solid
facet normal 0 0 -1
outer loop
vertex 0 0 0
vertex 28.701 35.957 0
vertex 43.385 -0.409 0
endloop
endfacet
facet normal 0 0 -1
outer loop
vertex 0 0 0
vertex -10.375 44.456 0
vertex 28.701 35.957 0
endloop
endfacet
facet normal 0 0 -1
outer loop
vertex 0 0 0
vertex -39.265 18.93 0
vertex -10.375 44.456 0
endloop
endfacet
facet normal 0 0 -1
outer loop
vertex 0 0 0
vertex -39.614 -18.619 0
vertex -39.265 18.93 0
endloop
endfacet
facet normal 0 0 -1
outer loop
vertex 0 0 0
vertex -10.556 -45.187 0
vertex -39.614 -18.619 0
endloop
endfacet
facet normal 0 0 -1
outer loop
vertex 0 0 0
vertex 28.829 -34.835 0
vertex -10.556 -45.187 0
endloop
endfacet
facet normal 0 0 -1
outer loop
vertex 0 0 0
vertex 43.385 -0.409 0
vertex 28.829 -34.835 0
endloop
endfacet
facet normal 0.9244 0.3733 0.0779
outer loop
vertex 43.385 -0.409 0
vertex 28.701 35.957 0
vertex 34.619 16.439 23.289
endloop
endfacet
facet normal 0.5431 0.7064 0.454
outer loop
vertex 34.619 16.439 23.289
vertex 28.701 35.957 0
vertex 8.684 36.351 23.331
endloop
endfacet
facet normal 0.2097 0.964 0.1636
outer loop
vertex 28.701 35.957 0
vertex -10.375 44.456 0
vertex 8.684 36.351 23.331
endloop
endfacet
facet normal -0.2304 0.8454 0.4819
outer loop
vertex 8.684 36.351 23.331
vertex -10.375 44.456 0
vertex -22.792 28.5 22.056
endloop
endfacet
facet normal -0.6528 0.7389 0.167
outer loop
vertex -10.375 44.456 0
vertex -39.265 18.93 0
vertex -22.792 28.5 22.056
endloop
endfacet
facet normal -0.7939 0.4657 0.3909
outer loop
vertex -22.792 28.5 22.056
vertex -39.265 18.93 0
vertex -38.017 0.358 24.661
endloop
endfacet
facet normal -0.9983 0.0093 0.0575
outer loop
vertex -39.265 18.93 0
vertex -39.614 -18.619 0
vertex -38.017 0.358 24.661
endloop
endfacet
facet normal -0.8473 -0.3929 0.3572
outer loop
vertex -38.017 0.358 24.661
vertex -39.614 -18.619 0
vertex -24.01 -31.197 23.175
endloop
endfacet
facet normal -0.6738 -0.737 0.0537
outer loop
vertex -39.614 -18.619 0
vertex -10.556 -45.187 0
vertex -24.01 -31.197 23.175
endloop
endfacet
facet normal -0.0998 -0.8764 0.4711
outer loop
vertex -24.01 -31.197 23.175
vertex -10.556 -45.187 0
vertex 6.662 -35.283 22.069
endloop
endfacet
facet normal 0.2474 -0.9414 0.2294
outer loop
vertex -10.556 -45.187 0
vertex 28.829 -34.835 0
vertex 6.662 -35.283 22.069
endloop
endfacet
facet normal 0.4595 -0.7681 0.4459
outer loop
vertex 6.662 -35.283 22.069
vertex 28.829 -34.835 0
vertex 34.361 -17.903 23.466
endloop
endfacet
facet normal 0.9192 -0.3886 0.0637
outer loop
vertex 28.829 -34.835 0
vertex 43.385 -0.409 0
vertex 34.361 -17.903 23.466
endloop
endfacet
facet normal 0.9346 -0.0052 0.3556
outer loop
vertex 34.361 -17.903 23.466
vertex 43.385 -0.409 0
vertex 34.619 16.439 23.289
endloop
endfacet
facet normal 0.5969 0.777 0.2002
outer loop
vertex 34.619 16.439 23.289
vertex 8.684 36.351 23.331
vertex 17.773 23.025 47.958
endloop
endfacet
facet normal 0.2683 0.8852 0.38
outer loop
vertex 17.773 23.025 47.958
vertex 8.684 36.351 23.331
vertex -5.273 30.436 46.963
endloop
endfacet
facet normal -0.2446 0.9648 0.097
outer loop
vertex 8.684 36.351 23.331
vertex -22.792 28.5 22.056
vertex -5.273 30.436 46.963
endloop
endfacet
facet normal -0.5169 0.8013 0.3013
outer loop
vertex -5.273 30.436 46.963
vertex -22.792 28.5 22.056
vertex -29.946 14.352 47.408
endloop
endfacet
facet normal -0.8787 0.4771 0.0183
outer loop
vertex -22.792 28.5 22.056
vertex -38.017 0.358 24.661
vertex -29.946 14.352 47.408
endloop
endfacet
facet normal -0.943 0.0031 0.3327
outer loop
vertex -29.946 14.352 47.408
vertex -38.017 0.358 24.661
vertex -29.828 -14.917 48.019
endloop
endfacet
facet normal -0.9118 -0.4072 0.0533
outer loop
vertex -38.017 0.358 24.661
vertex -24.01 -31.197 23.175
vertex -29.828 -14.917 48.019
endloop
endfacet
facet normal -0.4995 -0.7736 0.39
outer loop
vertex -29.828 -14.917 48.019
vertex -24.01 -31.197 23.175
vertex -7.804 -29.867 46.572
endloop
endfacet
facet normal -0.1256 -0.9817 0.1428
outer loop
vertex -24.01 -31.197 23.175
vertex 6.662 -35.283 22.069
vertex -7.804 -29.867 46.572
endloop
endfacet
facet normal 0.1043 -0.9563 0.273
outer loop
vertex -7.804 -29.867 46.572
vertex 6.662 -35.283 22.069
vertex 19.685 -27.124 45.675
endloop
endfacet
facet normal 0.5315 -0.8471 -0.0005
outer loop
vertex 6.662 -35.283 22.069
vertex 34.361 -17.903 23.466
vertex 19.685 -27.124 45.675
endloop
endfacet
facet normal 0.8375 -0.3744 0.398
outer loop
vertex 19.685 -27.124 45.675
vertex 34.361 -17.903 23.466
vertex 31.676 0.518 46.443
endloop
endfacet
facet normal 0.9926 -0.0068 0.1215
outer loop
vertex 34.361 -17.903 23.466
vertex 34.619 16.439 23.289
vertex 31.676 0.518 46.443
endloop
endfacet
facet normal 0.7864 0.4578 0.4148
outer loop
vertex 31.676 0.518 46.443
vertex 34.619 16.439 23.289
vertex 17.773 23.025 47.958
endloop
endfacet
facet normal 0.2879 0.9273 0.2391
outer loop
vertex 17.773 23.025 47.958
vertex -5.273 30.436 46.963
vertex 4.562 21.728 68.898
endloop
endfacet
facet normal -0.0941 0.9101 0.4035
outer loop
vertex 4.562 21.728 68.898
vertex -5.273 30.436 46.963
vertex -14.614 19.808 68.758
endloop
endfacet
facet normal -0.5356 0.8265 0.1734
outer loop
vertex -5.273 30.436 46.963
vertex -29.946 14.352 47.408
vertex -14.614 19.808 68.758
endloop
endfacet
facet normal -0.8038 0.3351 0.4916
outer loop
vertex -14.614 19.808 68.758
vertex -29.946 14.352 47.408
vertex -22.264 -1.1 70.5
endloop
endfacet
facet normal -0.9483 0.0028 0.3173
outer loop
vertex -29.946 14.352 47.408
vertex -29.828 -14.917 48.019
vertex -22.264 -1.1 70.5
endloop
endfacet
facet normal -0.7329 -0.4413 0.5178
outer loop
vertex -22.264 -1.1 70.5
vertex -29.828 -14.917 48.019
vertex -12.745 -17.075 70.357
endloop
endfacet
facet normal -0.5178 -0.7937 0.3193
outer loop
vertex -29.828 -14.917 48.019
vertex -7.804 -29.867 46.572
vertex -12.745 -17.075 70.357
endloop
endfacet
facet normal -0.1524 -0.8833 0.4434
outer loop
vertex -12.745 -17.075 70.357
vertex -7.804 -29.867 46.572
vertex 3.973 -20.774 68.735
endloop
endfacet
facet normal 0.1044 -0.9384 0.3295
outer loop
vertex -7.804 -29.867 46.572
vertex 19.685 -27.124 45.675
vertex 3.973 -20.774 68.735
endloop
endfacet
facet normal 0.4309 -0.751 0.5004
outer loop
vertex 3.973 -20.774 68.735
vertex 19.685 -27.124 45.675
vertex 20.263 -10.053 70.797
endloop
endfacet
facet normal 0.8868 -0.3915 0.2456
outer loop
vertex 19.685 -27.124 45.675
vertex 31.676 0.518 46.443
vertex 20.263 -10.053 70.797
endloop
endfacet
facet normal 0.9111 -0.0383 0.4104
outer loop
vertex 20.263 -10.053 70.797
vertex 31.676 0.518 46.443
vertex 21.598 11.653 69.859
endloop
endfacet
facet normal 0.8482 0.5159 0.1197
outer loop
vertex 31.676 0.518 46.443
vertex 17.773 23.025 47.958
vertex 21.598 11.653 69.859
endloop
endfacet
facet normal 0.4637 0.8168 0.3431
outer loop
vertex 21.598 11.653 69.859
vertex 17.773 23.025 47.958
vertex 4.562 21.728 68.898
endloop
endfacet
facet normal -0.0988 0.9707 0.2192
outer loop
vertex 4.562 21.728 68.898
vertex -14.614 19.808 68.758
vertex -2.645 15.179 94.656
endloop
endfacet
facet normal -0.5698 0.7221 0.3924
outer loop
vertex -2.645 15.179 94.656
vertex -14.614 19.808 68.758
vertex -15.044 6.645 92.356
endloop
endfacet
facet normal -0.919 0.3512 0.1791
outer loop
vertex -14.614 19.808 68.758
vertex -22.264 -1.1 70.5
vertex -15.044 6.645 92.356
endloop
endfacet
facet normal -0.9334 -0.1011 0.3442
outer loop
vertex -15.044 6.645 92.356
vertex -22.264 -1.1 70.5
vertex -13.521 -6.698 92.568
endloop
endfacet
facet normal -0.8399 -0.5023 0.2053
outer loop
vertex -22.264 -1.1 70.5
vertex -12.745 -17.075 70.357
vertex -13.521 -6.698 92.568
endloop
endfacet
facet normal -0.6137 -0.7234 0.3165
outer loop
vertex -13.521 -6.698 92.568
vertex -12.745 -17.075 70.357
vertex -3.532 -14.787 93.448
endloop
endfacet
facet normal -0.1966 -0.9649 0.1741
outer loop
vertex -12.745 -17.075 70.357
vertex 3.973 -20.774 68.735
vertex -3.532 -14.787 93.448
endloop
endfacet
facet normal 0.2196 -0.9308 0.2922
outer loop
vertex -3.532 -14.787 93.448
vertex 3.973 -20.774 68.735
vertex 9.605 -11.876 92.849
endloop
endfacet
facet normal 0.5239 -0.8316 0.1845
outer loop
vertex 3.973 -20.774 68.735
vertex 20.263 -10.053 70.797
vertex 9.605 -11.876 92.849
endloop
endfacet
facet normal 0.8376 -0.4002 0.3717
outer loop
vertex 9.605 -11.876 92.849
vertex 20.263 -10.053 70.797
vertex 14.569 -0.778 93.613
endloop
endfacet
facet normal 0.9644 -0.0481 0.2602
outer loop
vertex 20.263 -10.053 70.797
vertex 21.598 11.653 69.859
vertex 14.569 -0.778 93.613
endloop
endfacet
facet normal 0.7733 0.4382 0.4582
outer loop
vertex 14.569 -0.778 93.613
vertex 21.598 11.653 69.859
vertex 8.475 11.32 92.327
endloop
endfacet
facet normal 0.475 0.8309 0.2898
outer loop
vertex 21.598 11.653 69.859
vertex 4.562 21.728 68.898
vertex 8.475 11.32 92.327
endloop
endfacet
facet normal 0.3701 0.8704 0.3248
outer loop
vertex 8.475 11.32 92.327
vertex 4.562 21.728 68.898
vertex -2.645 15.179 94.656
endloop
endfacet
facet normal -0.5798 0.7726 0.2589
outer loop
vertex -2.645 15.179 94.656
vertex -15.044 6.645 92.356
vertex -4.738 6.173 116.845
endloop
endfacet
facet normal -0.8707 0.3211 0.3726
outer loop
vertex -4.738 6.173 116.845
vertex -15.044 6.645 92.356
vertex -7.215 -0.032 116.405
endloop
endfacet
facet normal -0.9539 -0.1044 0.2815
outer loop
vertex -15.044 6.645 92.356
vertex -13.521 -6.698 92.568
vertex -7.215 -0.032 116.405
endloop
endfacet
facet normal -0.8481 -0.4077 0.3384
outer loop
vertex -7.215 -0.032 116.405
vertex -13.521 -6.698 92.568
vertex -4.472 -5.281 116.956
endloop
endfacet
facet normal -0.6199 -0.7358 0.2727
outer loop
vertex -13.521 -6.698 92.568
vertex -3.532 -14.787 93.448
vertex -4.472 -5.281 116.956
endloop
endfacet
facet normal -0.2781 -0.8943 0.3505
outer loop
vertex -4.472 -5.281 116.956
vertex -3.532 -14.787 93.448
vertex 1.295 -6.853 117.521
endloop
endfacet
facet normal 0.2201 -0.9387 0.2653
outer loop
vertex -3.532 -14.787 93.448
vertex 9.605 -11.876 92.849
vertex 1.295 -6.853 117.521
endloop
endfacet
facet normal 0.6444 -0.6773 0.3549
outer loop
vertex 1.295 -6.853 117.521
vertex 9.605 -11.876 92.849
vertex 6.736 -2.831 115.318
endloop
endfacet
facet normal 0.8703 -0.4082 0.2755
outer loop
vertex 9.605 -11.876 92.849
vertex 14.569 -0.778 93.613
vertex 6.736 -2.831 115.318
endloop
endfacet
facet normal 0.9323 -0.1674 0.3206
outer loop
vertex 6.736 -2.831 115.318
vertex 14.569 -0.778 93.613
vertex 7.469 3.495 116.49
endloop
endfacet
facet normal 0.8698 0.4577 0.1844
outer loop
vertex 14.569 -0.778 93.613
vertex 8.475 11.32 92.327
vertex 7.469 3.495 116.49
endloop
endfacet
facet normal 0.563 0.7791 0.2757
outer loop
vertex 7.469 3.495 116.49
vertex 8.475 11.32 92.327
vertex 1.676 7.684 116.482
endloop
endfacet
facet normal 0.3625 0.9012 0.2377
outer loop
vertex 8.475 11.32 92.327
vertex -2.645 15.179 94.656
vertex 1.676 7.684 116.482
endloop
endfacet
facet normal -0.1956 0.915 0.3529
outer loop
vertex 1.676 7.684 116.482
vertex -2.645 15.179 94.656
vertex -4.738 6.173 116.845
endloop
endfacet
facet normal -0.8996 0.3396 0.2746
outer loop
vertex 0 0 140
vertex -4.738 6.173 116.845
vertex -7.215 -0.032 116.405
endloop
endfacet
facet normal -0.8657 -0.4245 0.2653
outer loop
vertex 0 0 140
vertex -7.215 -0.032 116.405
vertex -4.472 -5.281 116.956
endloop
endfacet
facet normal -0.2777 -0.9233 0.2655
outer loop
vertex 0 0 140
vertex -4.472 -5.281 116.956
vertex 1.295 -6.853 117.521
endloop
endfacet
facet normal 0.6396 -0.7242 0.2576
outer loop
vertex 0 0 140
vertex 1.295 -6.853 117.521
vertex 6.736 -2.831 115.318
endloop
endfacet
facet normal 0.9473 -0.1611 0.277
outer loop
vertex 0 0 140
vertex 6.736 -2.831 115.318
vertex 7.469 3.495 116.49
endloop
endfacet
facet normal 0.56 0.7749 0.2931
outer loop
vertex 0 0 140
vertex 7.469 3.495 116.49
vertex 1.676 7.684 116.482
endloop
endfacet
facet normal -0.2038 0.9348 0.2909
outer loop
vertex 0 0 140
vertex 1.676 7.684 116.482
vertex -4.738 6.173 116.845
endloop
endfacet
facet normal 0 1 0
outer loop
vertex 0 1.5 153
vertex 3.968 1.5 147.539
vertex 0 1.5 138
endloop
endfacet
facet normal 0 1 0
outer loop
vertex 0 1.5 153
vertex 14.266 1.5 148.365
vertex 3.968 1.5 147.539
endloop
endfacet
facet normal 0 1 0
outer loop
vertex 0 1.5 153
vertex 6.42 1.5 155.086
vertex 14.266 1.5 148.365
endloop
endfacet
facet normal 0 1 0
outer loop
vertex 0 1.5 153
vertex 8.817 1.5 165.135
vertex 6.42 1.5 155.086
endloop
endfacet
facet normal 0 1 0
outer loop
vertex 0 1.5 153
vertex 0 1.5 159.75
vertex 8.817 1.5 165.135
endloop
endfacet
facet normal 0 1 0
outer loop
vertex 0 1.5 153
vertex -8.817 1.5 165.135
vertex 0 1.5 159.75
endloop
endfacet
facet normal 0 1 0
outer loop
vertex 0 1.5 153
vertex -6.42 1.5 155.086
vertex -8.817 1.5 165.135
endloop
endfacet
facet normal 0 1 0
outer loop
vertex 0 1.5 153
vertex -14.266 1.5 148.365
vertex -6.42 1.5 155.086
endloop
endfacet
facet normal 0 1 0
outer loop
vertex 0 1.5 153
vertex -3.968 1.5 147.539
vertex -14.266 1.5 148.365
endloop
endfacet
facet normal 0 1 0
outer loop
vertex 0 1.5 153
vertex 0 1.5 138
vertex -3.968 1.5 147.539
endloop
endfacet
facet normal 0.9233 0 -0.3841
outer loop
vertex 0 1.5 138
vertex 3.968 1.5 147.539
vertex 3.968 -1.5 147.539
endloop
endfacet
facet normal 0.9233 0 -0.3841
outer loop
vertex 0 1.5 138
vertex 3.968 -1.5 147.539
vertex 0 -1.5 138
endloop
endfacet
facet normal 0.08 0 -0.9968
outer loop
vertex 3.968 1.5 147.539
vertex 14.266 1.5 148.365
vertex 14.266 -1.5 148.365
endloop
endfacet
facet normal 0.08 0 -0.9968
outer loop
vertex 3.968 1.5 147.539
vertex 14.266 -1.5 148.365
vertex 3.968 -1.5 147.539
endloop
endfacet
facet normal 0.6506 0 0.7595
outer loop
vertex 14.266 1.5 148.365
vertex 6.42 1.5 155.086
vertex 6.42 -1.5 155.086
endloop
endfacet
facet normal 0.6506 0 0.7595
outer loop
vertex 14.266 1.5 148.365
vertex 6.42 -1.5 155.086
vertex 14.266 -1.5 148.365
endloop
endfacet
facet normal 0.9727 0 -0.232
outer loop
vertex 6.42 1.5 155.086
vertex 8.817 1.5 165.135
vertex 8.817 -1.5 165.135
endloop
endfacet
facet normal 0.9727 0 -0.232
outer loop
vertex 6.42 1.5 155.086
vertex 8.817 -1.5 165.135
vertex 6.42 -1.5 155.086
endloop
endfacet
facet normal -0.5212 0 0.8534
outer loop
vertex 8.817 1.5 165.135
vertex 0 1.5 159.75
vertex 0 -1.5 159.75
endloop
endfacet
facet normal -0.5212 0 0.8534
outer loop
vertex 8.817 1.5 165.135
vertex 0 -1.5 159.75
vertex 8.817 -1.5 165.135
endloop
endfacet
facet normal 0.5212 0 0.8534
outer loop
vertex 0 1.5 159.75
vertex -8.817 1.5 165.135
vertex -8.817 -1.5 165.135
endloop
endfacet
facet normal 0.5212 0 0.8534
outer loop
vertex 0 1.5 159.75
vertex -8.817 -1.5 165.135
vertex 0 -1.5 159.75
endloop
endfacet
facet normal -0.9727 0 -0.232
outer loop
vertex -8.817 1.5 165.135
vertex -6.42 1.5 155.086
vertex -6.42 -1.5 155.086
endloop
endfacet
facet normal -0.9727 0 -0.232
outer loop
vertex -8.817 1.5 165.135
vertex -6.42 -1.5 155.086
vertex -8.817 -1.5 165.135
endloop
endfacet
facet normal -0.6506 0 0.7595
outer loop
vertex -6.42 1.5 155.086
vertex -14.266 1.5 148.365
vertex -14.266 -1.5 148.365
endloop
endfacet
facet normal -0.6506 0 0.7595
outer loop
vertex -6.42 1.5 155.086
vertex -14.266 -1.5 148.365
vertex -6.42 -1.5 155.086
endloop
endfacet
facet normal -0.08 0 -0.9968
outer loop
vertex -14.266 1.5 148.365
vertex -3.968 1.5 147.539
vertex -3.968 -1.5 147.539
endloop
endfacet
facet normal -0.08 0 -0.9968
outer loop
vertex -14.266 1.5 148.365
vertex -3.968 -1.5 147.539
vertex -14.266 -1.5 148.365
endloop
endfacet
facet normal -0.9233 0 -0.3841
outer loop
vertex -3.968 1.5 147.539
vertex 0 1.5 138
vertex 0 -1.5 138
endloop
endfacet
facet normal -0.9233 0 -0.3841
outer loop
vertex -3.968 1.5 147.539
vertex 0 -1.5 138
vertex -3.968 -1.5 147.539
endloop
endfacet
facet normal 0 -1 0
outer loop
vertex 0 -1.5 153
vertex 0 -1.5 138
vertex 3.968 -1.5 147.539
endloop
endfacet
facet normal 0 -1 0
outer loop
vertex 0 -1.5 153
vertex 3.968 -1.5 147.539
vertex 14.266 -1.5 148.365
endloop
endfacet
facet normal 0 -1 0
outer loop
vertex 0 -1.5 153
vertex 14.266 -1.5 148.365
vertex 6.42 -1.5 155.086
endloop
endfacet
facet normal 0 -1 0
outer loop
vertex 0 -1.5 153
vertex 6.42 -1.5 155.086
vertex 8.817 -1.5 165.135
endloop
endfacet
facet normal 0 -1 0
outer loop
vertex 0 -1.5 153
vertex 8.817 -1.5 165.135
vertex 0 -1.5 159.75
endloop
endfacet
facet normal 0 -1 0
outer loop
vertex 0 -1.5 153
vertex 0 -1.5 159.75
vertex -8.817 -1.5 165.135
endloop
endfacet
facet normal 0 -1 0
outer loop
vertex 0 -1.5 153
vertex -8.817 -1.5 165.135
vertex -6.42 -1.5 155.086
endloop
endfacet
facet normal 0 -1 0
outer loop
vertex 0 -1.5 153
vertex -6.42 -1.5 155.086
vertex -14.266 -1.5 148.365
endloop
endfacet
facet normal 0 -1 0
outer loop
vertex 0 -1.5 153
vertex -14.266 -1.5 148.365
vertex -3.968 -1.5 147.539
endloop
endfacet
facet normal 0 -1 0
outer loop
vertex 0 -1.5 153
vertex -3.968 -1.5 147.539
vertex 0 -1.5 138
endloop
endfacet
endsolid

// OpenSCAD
// ── ESTRELA DO TOPO (comum às árvores de Natal) ──
// Não usa union(): a estrela entra no MESMO polyhedron que a árvore, como uma segunda
// casca fechada (as booleanas do OpenSCAD com malhas grandes demoram 10× mais). Os
// fatiadores juntam as cascas que se sobrepõem.
//   estrela_topo = "No topo"               estrela de pé, com 2 mm enterrados na ponta
//                  "À parte (para colar)"  estrela facetada deitada, ao lado da árvore
//                  "Sem estrela"
// Cada modelo define _topo_alt() (altura da ponta) e _r_max() (raio máximo da árvore).
// A mesma conta está em Maker_Pro_Frontend_Prod/lib/arvoresNatal.ts (pré-visualização).

function _q(a, b, c, d) = [[a, b, c], [a, c, d]];
function _prev() = !is_undef(modo) && modo == "preview";

// estrela de np pontas no plano XY: costas em z = 0, lados até z = b, bico até z = b + h
function _ept(i, np, R, ri, z, a0) = let(a = a0 + i * 180 / np, r = (i % 2 == 0) ? R : ri) [r * cos(a), r * sin(a), z];
function estrela_pts(np, R, ri, b, h, a0) = let(M = 2 * np)
    concat([for (i = [0 : M - 1]) _ept(i, np, R, ri, 0, a0)], [for (i = [0 : M - 1]) _ept(i, np, R, ri, b, a0)],
           [[0, 0, 0], [0, 0, b + h]]);
function estrela_faces(np, o) = let(M = 2 * np, C = o + 2 * M, A = C + 1) concat(
    [for (i = [0 : M - 1]) [C, o + (i + 1) % M, o + i]],
    [for (i = [0 : M - 1], t = _q(o + i, o + (i + 1) % M, o + M + (i + 1) % M, o + M + i)) t],
    [for (i = [0 : M - 1]) [A, o + M + i, o + M + (i + 1) % M]]);

function _topo_tipo() = is_undef(estrela_topo) ? "No topo" : estrela_topo;
function _rs() = is_undef(tamanho_estrela) ? 15 : tamanho_estrela;
function _topo_pts() =
    _topo_tipo() == "No topo" ?
        // de pé (plano XZ), uma ponta para baixo enterrada 2 mm na ponta da árvore; 3 mm de espessura
        let(e = 3, zc = _topo_alt() - 2 + _rs())
        [for (p = estrela_pts(5, _rs(), 0.45 * _rs(), e, 0, 270)) [p[0], -p[2] + e / 2, p[1] + zc]]
  : _topo_tipo() == "À parte (para colar)" ?
        let(dx = _r_max() + 6 + _rs())
        [for (p = estrela_pts(5, _rs(), 0.45 * _rs(), 1.6, 0.35 * _rs(), 90)) [p[0] + dx, p[1], p[2]]]
  : [];
function _topo_faces(o) = len(_topo_pts()) == 0 ? [] : estrela_faces(5, o);
// ── ÁRVORE LOW-POLY ──
// Árvore facetada: anéis de N vértices, cada um rodado meio lado em relação ao de baixo e com
// uma irregularidade "aleatória" (fixa pela semente), até à ponta. Tronco opcional que abre a 45°.
//
// Parâmetros: lados, aneis, raio, altura, irregularidade (%), semente, raio_tronco (0 = sem),
//   altura_tronco, estrela_topo, tamanho_estrela

function _n()   = is_undef(lados) ? 7 : max(3, round(lados));
function _M()   = is_undef(aneis) ? 6 : max(2, round(aneis));
function _R()   = is_undef(raio) ? 45 : raio;
function _H()   = is_undef(altura) ? 140 : altura;
function _irr() = (is_undef(irregularidade) ? 12 : irregularidade) / 100;
function _sem() = is_undef(semente) ? 7 : semente;
function _rtr() = is_undef(raio_tronco) ? 0 : raio_tronco;
function _htr() = is_undef(altura_tronco) ? 12 : altura_tronco;
function _tronco() = _rtr() > 0 && _htr() > 0;
function _topo_alt() = _H();
function _r_max() = _R() * (1 + _irr());

// número pseudo-aleatório 0..1 (a mesma conta no JS)
function _hash(i, j, c) = let(v = sin(i * 127.1 + j * 311.7 + c * 74.7 + _sem() * 17.3) * 43758.5453) v - floor(v);
function _seg() = 360 / _n();
function _zc0() = _tronco() ? _htr() + (_R() - _rtr()) * 1.05 : 0;     // fundo da copa (abertura a ~45°)
// anel k (0..): tronco (2 anéis) e depois a copa; cada anel roda meio lado
function _naneis() = (_tronco() ? 2 : 0) + _M();
function _vert(k, i) =
    let(rot = k * _seg() / 2, j = k - (_tronco() ? 2 : 0))
    j < 0 ? let(a = rot + i * _seg()) [_rtr() * cos(a), _rtr() * sin(a), j == -2 ? 0 : _htr()]
    : let(hz = (_H() - _zc0()) / _M(),
          fr = j == 0 ? 0.3 : 1,                                         // o anel de baixo mexe pouco (abertura)
          r  = _R() * (1 - j / _M()) * (1 + fr * _irr() * (2 * _hash(i, j, 0) - 1)),
          a  = rot + i * _seg() + _irr() * _seg() / 2 * (2 * _hash(i, j, 1) - 1),
          z  = _zc0() + j * hz + (j == 0 ? 0 : _irr() * hz * 0.5 * (2 * _hash(i, j, 2) - 1)))
      [r * cos(a), r * sin(a), z];

module arvore_lowpoly() {
    n = _n(); NK = _naneis();
    pts = concat([for (k = [0 : NK - 1], i = [0 : n - 1]) _vert(k, i)], [[0, 0, 0], [0, 0, _H()]]);
    B = NK * n; A = B + 1;
    faces = concat(
        [for (i = [0 : n - 1]) [B, (i + 1) % n, i]],                                                 // fundo
        [for (k = [0 : NK - 2], i = [0 : n - 1], t = [[k * n + i, k * n + (i + 1) % n, (k + 1) * n + i],
                                                     [(k + 1) * n + i, k * n + (i + 1) % n, (k + 1) * n + (i + 1) % n]]) t],
        [for (i = [0 : n - 1]) [A, (NK - 1) * n + i, (NK - 1) * n + (i + 1) % n]]);                  // ponta
    tp = _topo_pts();
    tf = _topo_faces(len(pts));
    polyhedron(points = concat(pts, tp), faces = [for (f = concat(faces, tf)) [f[2], f[1], f[0]]], convexity = 4);
}

arvore_lowpoly();
